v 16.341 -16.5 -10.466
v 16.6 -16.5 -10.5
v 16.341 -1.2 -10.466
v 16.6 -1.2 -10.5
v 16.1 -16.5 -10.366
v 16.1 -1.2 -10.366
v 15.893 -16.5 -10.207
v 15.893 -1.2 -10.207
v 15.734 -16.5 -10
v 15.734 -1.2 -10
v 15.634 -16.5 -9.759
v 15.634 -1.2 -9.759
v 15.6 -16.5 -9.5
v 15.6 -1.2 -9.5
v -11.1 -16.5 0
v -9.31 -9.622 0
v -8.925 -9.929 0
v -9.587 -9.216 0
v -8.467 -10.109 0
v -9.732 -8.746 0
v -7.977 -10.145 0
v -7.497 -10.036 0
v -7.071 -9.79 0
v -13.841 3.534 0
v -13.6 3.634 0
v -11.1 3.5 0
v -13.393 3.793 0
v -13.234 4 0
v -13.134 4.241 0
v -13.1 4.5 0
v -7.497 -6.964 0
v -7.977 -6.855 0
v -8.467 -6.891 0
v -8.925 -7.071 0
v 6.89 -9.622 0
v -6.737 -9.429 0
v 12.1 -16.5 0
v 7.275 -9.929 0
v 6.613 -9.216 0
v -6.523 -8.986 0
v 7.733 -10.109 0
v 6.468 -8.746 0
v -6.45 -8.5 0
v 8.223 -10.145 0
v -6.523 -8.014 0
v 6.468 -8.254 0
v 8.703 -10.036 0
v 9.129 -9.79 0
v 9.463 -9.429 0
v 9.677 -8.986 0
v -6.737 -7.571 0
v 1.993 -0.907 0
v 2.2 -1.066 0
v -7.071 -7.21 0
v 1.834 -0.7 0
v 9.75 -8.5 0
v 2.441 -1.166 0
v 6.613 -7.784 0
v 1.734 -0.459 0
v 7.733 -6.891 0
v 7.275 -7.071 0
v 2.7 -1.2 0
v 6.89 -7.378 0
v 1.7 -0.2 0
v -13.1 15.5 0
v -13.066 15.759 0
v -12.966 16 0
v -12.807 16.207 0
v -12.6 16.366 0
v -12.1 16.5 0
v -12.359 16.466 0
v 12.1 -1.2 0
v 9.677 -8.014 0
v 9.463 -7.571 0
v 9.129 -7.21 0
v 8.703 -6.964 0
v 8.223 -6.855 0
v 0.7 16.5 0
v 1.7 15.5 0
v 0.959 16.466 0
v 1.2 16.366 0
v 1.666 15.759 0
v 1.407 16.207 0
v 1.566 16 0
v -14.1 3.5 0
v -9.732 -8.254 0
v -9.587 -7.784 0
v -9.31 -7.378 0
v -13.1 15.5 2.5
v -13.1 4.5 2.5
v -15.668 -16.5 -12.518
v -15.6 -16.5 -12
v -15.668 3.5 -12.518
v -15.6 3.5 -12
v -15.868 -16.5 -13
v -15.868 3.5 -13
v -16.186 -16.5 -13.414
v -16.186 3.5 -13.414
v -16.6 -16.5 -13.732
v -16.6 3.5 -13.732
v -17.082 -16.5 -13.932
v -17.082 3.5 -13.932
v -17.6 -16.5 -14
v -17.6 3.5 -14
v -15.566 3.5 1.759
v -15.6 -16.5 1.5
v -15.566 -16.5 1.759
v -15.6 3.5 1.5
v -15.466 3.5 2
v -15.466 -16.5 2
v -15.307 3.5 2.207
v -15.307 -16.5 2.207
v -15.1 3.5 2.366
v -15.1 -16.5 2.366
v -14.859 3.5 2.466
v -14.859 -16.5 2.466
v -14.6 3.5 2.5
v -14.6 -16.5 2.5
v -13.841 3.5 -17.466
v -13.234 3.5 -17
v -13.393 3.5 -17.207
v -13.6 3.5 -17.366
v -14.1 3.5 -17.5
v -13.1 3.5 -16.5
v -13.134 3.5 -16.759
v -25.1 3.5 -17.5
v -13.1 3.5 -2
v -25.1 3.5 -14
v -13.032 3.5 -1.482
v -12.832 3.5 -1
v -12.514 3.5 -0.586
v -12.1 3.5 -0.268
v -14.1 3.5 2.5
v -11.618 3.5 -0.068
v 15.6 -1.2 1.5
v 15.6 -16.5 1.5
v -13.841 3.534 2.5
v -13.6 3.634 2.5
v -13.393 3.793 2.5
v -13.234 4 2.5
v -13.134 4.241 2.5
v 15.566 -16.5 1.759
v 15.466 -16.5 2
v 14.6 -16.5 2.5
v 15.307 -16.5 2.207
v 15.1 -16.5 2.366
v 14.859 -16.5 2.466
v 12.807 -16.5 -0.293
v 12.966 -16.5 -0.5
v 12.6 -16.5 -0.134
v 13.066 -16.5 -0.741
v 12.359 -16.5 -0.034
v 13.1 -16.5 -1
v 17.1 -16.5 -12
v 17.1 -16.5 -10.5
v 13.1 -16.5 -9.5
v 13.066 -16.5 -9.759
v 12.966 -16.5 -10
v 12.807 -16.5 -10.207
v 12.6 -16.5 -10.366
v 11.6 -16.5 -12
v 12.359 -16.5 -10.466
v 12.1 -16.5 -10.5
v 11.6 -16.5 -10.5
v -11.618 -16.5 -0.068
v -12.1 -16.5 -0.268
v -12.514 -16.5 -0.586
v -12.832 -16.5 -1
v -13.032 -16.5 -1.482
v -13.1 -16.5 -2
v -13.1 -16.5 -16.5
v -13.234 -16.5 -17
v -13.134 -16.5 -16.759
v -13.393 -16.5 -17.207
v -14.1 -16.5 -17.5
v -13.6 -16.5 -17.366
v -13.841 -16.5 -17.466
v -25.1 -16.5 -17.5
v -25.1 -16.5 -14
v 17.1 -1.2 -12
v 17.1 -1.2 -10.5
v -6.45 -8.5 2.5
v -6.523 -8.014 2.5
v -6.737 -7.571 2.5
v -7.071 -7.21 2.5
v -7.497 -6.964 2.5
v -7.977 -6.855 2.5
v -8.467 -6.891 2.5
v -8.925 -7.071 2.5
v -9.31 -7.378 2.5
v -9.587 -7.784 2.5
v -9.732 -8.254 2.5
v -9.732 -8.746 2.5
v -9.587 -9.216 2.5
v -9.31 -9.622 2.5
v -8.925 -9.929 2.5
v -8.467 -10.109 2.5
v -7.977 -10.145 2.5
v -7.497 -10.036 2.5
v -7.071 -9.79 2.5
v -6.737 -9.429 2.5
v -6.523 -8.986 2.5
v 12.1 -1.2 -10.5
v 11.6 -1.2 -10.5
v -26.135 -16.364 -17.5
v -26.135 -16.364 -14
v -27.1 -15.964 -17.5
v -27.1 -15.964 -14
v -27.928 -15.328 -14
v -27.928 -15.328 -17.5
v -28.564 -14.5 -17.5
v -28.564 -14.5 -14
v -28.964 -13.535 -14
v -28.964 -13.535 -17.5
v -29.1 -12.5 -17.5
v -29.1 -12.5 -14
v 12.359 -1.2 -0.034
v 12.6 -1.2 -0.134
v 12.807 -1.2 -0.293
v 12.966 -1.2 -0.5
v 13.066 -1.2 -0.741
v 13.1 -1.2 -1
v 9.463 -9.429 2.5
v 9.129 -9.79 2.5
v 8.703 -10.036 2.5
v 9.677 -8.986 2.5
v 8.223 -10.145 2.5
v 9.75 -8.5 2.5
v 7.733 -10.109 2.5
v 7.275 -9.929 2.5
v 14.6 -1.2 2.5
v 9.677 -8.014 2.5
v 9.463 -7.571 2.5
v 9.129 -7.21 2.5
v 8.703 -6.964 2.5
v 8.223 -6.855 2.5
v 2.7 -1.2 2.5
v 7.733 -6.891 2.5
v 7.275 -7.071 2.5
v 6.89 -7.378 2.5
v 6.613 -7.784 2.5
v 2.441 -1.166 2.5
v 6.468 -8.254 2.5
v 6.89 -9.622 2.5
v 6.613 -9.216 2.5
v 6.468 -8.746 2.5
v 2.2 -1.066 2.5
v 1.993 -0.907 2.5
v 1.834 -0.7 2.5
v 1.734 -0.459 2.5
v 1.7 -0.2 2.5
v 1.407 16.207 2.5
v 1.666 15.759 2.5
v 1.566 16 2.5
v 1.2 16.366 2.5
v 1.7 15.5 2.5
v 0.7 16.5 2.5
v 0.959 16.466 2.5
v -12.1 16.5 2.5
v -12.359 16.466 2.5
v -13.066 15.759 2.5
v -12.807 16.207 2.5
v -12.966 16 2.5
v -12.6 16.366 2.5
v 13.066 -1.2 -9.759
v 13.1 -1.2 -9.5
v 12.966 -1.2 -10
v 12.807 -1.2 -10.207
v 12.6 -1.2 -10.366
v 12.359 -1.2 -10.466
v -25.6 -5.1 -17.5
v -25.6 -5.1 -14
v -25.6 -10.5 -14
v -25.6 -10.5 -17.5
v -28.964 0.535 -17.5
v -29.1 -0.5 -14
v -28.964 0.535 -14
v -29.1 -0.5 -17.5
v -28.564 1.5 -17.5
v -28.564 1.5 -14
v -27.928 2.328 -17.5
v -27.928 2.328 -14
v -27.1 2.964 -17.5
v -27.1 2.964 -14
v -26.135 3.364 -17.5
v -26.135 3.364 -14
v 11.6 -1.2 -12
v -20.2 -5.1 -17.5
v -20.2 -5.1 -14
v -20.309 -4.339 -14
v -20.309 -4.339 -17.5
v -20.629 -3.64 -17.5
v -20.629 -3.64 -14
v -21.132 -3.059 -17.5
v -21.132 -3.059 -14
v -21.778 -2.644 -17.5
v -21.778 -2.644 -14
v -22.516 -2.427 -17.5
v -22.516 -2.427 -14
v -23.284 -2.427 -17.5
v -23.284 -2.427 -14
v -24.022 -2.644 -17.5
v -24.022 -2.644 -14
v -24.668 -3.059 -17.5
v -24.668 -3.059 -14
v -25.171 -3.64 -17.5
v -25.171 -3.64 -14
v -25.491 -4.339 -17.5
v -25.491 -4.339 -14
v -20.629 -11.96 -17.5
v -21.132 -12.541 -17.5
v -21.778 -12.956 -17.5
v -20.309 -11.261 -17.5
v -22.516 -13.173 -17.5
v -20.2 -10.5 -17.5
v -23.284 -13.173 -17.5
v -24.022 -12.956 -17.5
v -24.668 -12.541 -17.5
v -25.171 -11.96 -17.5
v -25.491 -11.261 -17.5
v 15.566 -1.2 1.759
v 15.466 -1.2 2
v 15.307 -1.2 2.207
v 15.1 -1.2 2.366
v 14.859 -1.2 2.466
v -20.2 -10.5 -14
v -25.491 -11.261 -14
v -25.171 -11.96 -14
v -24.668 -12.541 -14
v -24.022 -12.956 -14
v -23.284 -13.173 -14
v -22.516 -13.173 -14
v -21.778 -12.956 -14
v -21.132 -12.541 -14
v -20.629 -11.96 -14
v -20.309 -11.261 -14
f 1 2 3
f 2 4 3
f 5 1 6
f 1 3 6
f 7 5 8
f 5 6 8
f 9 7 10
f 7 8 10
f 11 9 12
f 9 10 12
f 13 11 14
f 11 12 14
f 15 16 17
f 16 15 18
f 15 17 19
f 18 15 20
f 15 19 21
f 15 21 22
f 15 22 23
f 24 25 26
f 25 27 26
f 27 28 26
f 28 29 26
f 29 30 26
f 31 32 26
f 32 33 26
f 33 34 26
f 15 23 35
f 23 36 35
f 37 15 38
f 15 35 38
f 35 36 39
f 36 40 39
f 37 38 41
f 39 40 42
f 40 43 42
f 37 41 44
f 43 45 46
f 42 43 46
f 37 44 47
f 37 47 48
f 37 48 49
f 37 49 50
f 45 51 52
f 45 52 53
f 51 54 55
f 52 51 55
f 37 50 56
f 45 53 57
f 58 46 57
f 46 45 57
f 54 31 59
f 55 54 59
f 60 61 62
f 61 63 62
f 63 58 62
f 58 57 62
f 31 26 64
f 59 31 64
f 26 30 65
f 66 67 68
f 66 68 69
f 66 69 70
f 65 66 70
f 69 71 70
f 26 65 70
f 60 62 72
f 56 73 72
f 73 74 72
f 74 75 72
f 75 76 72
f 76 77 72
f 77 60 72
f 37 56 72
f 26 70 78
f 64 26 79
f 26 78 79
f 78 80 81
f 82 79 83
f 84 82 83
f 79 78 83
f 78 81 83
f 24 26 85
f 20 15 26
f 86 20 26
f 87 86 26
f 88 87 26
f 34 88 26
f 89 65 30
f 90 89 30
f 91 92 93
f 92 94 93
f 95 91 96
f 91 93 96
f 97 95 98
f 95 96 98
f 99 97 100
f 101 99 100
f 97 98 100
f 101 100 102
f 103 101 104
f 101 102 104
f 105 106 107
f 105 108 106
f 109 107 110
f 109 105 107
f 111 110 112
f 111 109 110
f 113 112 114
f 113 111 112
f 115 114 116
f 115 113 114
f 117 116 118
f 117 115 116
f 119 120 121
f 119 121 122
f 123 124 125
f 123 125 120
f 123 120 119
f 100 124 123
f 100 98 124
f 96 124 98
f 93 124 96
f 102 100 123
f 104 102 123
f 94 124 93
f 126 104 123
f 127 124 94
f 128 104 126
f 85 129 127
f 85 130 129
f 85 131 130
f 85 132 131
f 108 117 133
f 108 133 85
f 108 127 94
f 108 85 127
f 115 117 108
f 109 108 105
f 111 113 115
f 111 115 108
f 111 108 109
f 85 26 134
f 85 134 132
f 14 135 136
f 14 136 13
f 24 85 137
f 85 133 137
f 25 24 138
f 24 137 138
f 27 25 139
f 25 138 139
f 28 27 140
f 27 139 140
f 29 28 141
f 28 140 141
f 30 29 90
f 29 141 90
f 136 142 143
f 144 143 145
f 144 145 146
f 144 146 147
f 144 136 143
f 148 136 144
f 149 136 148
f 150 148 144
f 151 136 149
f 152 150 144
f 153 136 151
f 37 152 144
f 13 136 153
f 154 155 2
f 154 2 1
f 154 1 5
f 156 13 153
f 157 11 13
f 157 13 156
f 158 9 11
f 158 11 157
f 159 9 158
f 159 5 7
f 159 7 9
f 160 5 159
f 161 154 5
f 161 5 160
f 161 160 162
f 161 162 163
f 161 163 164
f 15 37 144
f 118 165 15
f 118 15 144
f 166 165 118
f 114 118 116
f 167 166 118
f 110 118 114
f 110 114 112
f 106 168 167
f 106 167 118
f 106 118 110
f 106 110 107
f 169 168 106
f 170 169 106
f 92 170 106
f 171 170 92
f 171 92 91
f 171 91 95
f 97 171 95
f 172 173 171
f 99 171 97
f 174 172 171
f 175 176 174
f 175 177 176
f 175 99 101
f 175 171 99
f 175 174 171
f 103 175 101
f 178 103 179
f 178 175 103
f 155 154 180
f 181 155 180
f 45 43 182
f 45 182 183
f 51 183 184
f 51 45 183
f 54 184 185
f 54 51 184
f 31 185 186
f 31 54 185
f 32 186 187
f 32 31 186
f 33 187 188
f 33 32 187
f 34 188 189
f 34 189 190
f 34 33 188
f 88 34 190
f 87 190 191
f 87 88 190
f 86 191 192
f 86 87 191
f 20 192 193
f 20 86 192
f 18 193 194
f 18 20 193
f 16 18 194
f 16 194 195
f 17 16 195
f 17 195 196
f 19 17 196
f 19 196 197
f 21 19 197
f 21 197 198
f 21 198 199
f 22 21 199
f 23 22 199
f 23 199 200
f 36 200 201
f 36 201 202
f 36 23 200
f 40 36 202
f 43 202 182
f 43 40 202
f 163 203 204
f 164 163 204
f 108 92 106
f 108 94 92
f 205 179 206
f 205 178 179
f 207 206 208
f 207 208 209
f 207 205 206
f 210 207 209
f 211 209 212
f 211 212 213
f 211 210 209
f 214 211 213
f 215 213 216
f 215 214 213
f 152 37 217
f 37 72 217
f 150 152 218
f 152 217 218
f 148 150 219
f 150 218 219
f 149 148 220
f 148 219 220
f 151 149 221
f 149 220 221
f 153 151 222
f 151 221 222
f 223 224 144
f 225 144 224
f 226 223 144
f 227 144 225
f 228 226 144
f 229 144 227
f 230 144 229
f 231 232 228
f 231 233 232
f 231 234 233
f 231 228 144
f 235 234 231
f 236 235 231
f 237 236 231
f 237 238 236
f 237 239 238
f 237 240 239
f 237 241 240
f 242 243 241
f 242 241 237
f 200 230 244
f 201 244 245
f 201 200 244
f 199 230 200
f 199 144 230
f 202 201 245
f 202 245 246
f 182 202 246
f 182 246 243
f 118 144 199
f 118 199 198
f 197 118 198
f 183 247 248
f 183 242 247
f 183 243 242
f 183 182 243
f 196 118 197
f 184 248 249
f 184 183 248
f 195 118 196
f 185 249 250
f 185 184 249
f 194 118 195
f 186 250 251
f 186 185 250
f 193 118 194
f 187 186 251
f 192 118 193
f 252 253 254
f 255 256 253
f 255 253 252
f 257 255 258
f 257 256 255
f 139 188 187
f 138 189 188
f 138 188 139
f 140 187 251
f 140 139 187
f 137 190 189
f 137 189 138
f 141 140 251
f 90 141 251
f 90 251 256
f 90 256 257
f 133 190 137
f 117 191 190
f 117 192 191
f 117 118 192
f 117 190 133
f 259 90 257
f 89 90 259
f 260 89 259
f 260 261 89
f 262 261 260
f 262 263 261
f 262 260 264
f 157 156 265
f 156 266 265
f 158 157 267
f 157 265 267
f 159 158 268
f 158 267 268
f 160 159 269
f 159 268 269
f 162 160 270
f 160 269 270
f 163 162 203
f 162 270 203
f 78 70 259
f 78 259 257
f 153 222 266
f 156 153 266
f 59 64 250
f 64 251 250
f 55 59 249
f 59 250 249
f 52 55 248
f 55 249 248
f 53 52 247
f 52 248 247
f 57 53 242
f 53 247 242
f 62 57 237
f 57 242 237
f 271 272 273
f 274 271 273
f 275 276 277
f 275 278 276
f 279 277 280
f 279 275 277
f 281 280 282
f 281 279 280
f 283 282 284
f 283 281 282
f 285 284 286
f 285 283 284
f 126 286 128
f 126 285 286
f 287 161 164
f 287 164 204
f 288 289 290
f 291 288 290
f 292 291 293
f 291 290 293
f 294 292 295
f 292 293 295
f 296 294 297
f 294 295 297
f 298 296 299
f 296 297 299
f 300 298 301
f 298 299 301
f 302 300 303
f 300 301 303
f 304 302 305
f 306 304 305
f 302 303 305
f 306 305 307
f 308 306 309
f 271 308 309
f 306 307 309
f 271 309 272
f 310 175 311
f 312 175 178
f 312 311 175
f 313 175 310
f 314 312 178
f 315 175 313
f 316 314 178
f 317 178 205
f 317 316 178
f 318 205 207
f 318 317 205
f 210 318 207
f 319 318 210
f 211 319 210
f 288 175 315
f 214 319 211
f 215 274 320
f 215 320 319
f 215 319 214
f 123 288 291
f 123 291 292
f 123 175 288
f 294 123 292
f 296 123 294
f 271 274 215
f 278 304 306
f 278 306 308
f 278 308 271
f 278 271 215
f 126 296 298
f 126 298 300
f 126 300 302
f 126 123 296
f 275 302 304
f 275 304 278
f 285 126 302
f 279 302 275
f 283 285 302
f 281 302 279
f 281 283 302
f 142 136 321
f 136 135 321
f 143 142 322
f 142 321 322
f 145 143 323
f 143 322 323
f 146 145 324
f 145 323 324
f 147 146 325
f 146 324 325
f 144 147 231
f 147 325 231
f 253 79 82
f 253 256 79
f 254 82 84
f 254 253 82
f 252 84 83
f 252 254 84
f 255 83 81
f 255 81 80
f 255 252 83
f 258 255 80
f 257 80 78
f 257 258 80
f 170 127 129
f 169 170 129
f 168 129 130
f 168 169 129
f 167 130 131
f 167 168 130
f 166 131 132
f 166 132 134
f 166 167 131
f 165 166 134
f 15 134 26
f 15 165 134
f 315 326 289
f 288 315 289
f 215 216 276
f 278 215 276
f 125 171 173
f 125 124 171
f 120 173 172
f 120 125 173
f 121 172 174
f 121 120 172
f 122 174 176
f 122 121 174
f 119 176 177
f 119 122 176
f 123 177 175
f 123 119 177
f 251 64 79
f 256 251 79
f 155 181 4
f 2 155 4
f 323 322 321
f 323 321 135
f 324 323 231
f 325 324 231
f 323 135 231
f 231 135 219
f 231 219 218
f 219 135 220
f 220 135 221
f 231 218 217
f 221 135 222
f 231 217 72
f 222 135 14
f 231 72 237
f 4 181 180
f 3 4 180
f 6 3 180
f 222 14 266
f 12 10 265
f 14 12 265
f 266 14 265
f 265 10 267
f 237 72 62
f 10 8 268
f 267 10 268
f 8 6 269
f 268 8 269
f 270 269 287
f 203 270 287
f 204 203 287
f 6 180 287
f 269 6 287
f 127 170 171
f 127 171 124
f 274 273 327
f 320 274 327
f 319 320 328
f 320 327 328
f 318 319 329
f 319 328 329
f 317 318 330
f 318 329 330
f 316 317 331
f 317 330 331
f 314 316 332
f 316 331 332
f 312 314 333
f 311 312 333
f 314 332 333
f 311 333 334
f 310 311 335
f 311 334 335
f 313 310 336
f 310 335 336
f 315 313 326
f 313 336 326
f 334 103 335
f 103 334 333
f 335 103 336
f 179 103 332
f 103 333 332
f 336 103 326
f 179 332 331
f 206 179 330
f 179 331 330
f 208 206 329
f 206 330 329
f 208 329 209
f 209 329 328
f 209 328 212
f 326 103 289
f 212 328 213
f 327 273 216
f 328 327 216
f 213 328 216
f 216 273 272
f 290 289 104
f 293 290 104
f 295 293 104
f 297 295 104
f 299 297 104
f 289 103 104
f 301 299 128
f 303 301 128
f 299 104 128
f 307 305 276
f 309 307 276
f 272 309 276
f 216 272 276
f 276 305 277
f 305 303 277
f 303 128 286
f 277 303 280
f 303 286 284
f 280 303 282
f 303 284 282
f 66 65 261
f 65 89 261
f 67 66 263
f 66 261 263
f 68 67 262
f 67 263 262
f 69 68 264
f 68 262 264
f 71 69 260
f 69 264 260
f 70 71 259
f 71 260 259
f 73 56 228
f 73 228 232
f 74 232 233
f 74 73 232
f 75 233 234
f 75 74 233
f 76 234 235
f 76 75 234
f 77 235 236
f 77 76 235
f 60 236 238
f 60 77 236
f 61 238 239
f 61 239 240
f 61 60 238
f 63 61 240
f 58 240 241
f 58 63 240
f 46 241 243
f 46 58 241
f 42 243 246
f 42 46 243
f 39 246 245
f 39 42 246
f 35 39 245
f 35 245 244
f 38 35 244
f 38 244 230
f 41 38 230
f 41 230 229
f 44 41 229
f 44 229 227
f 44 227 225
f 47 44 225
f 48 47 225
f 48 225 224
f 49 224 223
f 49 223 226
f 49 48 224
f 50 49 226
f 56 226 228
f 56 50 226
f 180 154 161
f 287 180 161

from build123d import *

# Parameters (mm, degrees)
SKETCH1_W            = 14.8
SKETCH1_H            = 17.7
SKETCH1_R            = 1.65
BOSS_EXTRUDE1_DEPTH  = 2.5
FILLET1_R            = 1
SKETCH6_W            = 16.5
SKETCH6_H            = 20
BOSS_EXTRUDE8_DEPTH  = 2.5
SKETCH7_W            = 13.5
SKETCH7_H            = 20
SKETCH7_W_2          = 2.5
BOSS_EXTRUDE9_DEPTH  = 3.5
FILLET5_R            = 2
FILLET6_R            = 1
SKETCH10_W           = 14.5
SKETCH10_H           = 15.3
BOSS_EXTRUDE10_DEPTH = 2.5
SKETCH11_W           = 5.5
SKETCH11_H           = 15.3
BOSS_EXTRUDE11_DEPTH = 1.5
FILLET7_R            = 1
FILLET8_R            = 4


with BuildPart() as part:
    # Sketch1 → Boss-Extrude1 (new body)
    # profile 1 of 2: a face of its own
    with BuildSketch(Plane.XY):
        with Locations((-5.7, 7.65)):
            Rectangle(SKETCH1_W, SKETCH1_H)
    # profile 2 of 2: a face of its own
    with BuildSketch(Plane.XY):
        Polygon((1.7, -1.2), (-13.1, -1.2), (-13.1, -16.5), (13.1, -16.5), (13.1, -1.2), align=None)
        with Locations((-8.1, -8.5)):
            Circle(SKETCH1_R, mode=Mode.SUBTRACT)
        with Locations((8.1, -8.5)):
            Circle(SKETCH1_R, mode=Mode.SUBTRACT)
    extrude(amount=BOSS_EXTRUDE1_DEPTH)

    # Fillet1
    fillet1_edges = [part.edges().sort_by_distance(p)[0] for p in [
        (1.7, 16.5, 1.25),
        (-13.1, 16.5, 1.25),
    ]]
    fillet(fillet1_edges, radius=FILLET1_R)

    # Sketch6 → Boss-Extrude8 (add)
    with BuildSketch(Plane.ZY.offset(13.1)):
        with Locations((-5.75, -6.5)):
            Rectangle(SKETCH6_W, SKETCH6_H)
    extrude(amount=BOSS_EXTRUDE8_DEPTH)

    # Sketch7 → Boss-Extrude9 (add)
    # profile 1 of 2: a face of its own
    with BuildSketch(Plane(origin=(0, 0, -14), x_dir=(-1, 0, 0), z_dir=(0, 0, -1))):
        with Locations((22.35, -6.5)):
            Rectangle(SKETCH7_W, SKETCH7_H)
        with BuildLine():
            ThreePointArc((20.2, -5.1), (22.9, -2.4), (25.6, -5.1))
            Line((25.6, -5.1), (25.6, -10.5))
            ThreePointArc((25.6, -10.5), (22.9, -13.2), (20.2, -10.5))
            Line((20.2, -10.5), (20.2, -5.1))
        make_face(mode=Mode.SUBTRACT)
    # profile 2 of 2: a face of its own
    with BuildSketch(Plane(origin=(0, 0, -14), x_dir=(-1, 0, 0), z_dir=(0, 0, -1))):
        with Locations((14.35, -6.5)):
            Rectangle(SKETCH7_W_2, SKETCH7_H)
    extrude(amount=BOSS_EXTRUDE9_DEPTH)

    # Fillet5
    fillet5_edges = [part.edges().sort_by_distance(p)[0] for p in [
        (-13.1, -6.5, 0),
        (-15.6, -6.5, -14),
    ]]
    fillet(fillet5_edges, radius=FILLET5_R)

    # Fillet6
    fillet6_edges = [part.edges().sort_by_distance(p)[0] for p in [
        (-13.1, 3.5, 1.25),
        (-15.6, -6.5, 2.5),
    ]]
    fillet(fillet6_edges, radius=FILLET6_R)

    # Sketch10 → Boss-Extrude10 (add)
    with BuildSketch(Plane(origin=(13.1, 0, 0), x_dir=(0, 0, -1), z_dir=(1, 0, 0))):
        with Locations((4.75, -8.85)):
            Rectangle(SKETCH10_W, SKETCH10_H)
    extrude(amount=BOSS_EXTRUDE10_DEPTH)

    # Sketch11 → Boss-Extrude11 (add)
    with BuildSketch(Plane(origin=(0, 0, -12), x_dir=(-1, 0, 0), z_dir=(0, 0, -1))):
        with Locations((-14.35, -8.85)):
            Rectangle(SKETCH11_W, SKETCH11_H)
    extrude(amount=-BOSS_EXTRUDE11_DEPTH)

    # Fillet7
    fillet7_edges = [part.edges().sort_by_distance(p)[0] for p in [
        (13.1, -8.85, 0),
        (15.6, -8.85, 2.5),
        (15.6, -8.85, -10.5),
        (13.1, -8.85, -10.5),
        (1.7, -1.2, 1.25),
        (-13.1, -6.5, -17.5),
    ]]
    fillet(fillet7_edges, radius=FILLET7_R)

    # Fillet8
    fillet8_edges = [part.edges().sort_by_distance(p)[0] for p in [
        (-29.1, -16.5, -15.75),
        (-29.1, 3.5, -15.75),
    ]]
    fillet(fillet8_edges, radius=FILLET8_R)


solid = part.part
